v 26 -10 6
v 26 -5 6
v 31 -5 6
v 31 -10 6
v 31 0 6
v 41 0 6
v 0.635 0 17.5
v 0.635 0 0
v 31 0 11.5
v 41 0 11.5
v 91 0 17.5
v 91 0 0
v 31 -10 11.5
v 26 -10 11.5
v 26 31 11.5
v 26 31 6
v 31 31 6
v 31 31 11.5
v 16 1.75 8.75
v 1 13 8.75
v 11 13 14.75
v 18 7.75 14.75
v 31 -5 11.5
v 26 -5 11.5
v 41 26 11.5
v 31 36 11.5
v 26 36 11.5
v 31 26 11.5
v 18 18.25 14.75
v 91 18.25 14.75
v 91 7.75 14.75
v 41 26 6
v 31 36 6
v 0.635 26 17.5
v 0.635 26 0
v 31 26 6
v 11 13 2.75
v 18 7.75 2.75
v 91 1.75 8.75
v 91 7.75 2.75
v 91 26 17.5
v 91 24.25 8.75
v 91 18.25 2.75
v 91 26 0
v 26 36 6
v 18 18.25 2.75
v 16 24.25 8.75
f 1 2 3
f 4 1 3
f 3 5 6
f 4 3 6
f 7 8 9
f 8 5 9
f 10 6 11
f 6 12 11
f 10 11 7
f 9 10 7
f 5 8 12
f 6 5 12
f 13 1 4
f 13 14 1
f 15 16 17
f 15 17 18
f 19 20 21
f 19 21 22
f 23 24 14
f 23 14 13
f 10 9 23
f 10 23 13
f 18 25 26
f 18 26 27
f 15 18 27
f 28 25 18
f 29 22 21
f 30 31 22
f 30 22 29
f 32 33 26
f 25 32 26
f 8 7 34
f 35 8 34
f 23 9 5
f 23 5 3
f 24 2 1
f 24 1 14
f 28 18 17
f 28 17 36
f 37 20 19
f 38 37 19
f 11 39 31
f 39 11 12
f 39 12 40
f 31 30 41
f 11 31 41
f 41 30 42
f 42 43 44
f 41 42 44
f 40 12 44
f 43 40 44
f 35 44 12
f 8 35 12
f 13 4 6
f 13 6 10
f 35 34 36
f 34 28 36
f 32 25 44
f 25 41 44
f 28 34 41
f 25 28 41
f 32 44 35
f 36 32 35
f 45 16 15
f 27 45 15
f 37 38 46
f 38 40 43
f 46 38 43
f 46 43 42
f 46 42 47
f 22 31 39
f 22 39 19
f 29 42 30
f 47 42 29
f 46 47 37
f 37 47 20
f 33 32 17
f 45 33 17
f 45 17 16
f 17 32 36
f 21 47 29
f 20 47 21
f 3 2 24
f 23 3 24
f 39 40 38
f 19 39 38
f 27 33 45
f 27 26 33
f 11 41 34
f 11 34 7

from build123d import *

# Parameters (mm, degrees)
F1_DEPTH  = 10
F2_W      = 21
F2_H      = 10
F3_DEPTH  = 9
F4_DEPTH  = 2
F5_DEPTH  = 3
F6_DEPTH  = 5
F7_DEPTH  = 2.5
F8_W      = 22.5
F8_H      = 12
F9_DEPTH  = 75
F11_DEPTH = 12
F12_SIZE  = 5.99999
F13_W     = 15
F13_H     = 5.5
F14_DEPTH = 10
F15_SIZE  = 9.99999
F16_W     = 5
F16_H     = 5.5
F17_DEPTH = 5
F18_W     = 15
F18_H     = 5.5
F19_DEPTH = 10
F20_SIZE  = 9.99999
F21_W     = 5
F21_H     = 5.5
F22_DEPTH = 5
F23_DEPTH = 5
F24_SIZE  = 5
F25_DEPTH = 5
F29_DEPTH = 25


# Not quite as in the source:
# - a fillet or chamfer is up to 0.001 mm smaller than in the source, because OpenCascade refuses the exact size
# - a feature of the source that left no trace in its solid (it failed there, or was rolled back) is left out


with BuildPart() as f1:
    # F0 (on Top) → F1 (new body)
    with BuildSketch(Plane.XY):
        Polygon((0, 10.5), (0, 0), (15, 0), align=None)
        Polygon((0, 10.5), (15, 0), (91, 0), (91, 21), (15, 21), align=None)
        Polygon((0, 21), (0, 10.5), (15, 21), align=None)
    extrude(amount=F1_DEPTH)

    # F2 (on face) → F3 (join)
    with BuildSketch(Plane(origin=(0, 0, 0), x_dir=(0, -1, 0), z_dir=(-1, 0, 0))):
        with Locations((-10.5, 5)):
            Rectangle(F2_W, F2_H)
    extrude(amount=F3_DEPTH)

    # F4 (add): a face of the model
    f4_faces = [f1.faces().sort_by_distance(p)[0] for p in [
        (41, 10.5, 10),
    ]]
    extrude(f4_faces, amount=F4_DEPTH)

    # F5 (add): a face of the model
    f5_faces = [f1.faces().sort_by_distance(p)[0] for p in [
        (41, 10.5, 12),
    ]]
    extrude(f5_faces, amount=F5_DEPTH)

    # F6 (add): a face of the model
    f6_faces = [f1.faces().sort_by_distance(p)[0] for p in [
        (41, 21, 7.5),
    ]]
    extrude(f6_faces, amount=F6_DEPTH)

    # F7 (add): a face of the model
    f7_faces = [f1.faces().sort_by_distance(p)[0] for p in [
        (41, 13, 15),
    ]]
    extrude(f7_faces, amount=F7_DEPTH)

    # F8 (on face) → F9 (cut)
    with BuildSketch(Plane.YZ.offset(91)):
        with Locations((13, 8.75)):
            Rectangle(F8_W, F8_H)
    extrude(amount=-F9_DEPTH, mode=Mode.SUBTRACT)

    # F10 (on face) → F11 (cut)
    with BuildSketch(Plane.XY.offset(2.75)):
        Polygon((16, 1.75), (16, 13), (1, 13), align=None)
        Polygon((1, 13), (16, 13), (16, 24.25), align=None)
    extrude(amount=F11_DEPTH, mode=Mode.SUBTRACT)

    # F12 (size 6 in the source; OpenCascade refuses exactly that, so slightly less here)
    f12_edges = [f1.edges().sort_by_distance(p)[0] for p in [
        (8.5, 7.375, 14.75),
        (8.5, 18.625, 14.75),
        (8.5, 7.375, 2.75),
        (8.5, 18.625, 2.75),
        (53.5, 1.75, 2.75),
        (53.5, 1.75, 14.75),
        (53.5, 24.25, 14.75),
        (53.5, 24.25, 2.75),
    ]]
    chamfer(f12_edges, length=F12_SIZE)

    # F13 (on face) → F14 (join)
    with BuildSketch(Plane(origin=(0, 26, 0), x_dir=(-1, 0, 0), z_dir=(0, 1, 0))):
        with Locations((-33.5, 8.75)):
            Rectangle(F13_W, F13_H)
    extrude(amount=F14_DEPTH)

    # F15 (size 10 in the source; OpenCascade refuses exactly that, so slightly less here)
    f15_edges = [f1.edges().sort_by_distance(p)[0] for p in [
        (41, 36, 8.75),
    ]]
    chamfer(f15_edges, length=F15_SIZE)

    # F16 (on face) → F17 (cut)
    with BuildSketch(Plane(origin=(26, 0, 0), x_dir=(0, -1, 0), z_dir=(-1, 0, 0))):
        with Locations((-28.5, 8.75)):
            Rectangle(F16_W, F16_H)
    extrude(amount=-F17_DEPTH, mode=Mode.SUBTRACT)

    # F18 (on face) → F19 (join)
    with BuildSketch(Plane.XZ):
        with Locations((33.5, 8.75)):
            Rectangle(F18_W, F18_H)
    extrude(amount=F19_DEPTH)

    # F20 (size 10 in the source; OpenCascade refuses exactly that, so slightly less here)
    f20_edges = [f1.edges().sort_by_distance(p)[0] for p in [
        (41, -10, 8.75),
    ]]
    chamfer(f20_edges, length=F20_SIZE)

    # F21 (on face) → F22 (cut)
    with BuildSketch(Plane(origin=(26, 0, 0), x_dir=(0, -1, 0), z_dir=(-1, 0, 0))):
        with Locations((2.5, 8.75)):
            Rectangle(F21_W, F21_H)
    extrude(amount=-F22_DEPTH, mode=Mode.SUBTRACT)

    # F23 (add): a face of the model
    f23_faces = [f1.faces().sort_by_distance(p)[0] for p in [
        (-9, 13, 8.75),
    ]]
    extrude(f23_faces, amount=F23_DEPTH)

    # F24
    f24_edges = [f1.edges().sort_by_distance(p)[0] for p in [
        (-14, 26, 8.75),
        (-14, 13, 17.5),
        (-14, 0, 8.75),
        (-14, 13, 0),
    ]]
    chamfer(f24_edges, length=F24_SIZE)

    # F25 (add): a face of the model
    f25_faces = [f1.faces().sort_by_distance(p)[0] for p in [
        (-14, 13, 8.75),
    ]]
    extrude(f25_faces, amount=F25_DEPTH)

    # F28 (on face) → F29 (cut)
    with BuildSketch(Plane.XY.offset(17.5)):
        Polygon((-36.3743491471, 0), (0.634705736, 0), (0.634705736, 13), (0.634705736, 34.4582907856), (-36.3743491471, 34.4582907856), align=None)
    extrude(amount=-F29_DEPTH, mode=Mode.SUBTRACT)


solid = f1.part
